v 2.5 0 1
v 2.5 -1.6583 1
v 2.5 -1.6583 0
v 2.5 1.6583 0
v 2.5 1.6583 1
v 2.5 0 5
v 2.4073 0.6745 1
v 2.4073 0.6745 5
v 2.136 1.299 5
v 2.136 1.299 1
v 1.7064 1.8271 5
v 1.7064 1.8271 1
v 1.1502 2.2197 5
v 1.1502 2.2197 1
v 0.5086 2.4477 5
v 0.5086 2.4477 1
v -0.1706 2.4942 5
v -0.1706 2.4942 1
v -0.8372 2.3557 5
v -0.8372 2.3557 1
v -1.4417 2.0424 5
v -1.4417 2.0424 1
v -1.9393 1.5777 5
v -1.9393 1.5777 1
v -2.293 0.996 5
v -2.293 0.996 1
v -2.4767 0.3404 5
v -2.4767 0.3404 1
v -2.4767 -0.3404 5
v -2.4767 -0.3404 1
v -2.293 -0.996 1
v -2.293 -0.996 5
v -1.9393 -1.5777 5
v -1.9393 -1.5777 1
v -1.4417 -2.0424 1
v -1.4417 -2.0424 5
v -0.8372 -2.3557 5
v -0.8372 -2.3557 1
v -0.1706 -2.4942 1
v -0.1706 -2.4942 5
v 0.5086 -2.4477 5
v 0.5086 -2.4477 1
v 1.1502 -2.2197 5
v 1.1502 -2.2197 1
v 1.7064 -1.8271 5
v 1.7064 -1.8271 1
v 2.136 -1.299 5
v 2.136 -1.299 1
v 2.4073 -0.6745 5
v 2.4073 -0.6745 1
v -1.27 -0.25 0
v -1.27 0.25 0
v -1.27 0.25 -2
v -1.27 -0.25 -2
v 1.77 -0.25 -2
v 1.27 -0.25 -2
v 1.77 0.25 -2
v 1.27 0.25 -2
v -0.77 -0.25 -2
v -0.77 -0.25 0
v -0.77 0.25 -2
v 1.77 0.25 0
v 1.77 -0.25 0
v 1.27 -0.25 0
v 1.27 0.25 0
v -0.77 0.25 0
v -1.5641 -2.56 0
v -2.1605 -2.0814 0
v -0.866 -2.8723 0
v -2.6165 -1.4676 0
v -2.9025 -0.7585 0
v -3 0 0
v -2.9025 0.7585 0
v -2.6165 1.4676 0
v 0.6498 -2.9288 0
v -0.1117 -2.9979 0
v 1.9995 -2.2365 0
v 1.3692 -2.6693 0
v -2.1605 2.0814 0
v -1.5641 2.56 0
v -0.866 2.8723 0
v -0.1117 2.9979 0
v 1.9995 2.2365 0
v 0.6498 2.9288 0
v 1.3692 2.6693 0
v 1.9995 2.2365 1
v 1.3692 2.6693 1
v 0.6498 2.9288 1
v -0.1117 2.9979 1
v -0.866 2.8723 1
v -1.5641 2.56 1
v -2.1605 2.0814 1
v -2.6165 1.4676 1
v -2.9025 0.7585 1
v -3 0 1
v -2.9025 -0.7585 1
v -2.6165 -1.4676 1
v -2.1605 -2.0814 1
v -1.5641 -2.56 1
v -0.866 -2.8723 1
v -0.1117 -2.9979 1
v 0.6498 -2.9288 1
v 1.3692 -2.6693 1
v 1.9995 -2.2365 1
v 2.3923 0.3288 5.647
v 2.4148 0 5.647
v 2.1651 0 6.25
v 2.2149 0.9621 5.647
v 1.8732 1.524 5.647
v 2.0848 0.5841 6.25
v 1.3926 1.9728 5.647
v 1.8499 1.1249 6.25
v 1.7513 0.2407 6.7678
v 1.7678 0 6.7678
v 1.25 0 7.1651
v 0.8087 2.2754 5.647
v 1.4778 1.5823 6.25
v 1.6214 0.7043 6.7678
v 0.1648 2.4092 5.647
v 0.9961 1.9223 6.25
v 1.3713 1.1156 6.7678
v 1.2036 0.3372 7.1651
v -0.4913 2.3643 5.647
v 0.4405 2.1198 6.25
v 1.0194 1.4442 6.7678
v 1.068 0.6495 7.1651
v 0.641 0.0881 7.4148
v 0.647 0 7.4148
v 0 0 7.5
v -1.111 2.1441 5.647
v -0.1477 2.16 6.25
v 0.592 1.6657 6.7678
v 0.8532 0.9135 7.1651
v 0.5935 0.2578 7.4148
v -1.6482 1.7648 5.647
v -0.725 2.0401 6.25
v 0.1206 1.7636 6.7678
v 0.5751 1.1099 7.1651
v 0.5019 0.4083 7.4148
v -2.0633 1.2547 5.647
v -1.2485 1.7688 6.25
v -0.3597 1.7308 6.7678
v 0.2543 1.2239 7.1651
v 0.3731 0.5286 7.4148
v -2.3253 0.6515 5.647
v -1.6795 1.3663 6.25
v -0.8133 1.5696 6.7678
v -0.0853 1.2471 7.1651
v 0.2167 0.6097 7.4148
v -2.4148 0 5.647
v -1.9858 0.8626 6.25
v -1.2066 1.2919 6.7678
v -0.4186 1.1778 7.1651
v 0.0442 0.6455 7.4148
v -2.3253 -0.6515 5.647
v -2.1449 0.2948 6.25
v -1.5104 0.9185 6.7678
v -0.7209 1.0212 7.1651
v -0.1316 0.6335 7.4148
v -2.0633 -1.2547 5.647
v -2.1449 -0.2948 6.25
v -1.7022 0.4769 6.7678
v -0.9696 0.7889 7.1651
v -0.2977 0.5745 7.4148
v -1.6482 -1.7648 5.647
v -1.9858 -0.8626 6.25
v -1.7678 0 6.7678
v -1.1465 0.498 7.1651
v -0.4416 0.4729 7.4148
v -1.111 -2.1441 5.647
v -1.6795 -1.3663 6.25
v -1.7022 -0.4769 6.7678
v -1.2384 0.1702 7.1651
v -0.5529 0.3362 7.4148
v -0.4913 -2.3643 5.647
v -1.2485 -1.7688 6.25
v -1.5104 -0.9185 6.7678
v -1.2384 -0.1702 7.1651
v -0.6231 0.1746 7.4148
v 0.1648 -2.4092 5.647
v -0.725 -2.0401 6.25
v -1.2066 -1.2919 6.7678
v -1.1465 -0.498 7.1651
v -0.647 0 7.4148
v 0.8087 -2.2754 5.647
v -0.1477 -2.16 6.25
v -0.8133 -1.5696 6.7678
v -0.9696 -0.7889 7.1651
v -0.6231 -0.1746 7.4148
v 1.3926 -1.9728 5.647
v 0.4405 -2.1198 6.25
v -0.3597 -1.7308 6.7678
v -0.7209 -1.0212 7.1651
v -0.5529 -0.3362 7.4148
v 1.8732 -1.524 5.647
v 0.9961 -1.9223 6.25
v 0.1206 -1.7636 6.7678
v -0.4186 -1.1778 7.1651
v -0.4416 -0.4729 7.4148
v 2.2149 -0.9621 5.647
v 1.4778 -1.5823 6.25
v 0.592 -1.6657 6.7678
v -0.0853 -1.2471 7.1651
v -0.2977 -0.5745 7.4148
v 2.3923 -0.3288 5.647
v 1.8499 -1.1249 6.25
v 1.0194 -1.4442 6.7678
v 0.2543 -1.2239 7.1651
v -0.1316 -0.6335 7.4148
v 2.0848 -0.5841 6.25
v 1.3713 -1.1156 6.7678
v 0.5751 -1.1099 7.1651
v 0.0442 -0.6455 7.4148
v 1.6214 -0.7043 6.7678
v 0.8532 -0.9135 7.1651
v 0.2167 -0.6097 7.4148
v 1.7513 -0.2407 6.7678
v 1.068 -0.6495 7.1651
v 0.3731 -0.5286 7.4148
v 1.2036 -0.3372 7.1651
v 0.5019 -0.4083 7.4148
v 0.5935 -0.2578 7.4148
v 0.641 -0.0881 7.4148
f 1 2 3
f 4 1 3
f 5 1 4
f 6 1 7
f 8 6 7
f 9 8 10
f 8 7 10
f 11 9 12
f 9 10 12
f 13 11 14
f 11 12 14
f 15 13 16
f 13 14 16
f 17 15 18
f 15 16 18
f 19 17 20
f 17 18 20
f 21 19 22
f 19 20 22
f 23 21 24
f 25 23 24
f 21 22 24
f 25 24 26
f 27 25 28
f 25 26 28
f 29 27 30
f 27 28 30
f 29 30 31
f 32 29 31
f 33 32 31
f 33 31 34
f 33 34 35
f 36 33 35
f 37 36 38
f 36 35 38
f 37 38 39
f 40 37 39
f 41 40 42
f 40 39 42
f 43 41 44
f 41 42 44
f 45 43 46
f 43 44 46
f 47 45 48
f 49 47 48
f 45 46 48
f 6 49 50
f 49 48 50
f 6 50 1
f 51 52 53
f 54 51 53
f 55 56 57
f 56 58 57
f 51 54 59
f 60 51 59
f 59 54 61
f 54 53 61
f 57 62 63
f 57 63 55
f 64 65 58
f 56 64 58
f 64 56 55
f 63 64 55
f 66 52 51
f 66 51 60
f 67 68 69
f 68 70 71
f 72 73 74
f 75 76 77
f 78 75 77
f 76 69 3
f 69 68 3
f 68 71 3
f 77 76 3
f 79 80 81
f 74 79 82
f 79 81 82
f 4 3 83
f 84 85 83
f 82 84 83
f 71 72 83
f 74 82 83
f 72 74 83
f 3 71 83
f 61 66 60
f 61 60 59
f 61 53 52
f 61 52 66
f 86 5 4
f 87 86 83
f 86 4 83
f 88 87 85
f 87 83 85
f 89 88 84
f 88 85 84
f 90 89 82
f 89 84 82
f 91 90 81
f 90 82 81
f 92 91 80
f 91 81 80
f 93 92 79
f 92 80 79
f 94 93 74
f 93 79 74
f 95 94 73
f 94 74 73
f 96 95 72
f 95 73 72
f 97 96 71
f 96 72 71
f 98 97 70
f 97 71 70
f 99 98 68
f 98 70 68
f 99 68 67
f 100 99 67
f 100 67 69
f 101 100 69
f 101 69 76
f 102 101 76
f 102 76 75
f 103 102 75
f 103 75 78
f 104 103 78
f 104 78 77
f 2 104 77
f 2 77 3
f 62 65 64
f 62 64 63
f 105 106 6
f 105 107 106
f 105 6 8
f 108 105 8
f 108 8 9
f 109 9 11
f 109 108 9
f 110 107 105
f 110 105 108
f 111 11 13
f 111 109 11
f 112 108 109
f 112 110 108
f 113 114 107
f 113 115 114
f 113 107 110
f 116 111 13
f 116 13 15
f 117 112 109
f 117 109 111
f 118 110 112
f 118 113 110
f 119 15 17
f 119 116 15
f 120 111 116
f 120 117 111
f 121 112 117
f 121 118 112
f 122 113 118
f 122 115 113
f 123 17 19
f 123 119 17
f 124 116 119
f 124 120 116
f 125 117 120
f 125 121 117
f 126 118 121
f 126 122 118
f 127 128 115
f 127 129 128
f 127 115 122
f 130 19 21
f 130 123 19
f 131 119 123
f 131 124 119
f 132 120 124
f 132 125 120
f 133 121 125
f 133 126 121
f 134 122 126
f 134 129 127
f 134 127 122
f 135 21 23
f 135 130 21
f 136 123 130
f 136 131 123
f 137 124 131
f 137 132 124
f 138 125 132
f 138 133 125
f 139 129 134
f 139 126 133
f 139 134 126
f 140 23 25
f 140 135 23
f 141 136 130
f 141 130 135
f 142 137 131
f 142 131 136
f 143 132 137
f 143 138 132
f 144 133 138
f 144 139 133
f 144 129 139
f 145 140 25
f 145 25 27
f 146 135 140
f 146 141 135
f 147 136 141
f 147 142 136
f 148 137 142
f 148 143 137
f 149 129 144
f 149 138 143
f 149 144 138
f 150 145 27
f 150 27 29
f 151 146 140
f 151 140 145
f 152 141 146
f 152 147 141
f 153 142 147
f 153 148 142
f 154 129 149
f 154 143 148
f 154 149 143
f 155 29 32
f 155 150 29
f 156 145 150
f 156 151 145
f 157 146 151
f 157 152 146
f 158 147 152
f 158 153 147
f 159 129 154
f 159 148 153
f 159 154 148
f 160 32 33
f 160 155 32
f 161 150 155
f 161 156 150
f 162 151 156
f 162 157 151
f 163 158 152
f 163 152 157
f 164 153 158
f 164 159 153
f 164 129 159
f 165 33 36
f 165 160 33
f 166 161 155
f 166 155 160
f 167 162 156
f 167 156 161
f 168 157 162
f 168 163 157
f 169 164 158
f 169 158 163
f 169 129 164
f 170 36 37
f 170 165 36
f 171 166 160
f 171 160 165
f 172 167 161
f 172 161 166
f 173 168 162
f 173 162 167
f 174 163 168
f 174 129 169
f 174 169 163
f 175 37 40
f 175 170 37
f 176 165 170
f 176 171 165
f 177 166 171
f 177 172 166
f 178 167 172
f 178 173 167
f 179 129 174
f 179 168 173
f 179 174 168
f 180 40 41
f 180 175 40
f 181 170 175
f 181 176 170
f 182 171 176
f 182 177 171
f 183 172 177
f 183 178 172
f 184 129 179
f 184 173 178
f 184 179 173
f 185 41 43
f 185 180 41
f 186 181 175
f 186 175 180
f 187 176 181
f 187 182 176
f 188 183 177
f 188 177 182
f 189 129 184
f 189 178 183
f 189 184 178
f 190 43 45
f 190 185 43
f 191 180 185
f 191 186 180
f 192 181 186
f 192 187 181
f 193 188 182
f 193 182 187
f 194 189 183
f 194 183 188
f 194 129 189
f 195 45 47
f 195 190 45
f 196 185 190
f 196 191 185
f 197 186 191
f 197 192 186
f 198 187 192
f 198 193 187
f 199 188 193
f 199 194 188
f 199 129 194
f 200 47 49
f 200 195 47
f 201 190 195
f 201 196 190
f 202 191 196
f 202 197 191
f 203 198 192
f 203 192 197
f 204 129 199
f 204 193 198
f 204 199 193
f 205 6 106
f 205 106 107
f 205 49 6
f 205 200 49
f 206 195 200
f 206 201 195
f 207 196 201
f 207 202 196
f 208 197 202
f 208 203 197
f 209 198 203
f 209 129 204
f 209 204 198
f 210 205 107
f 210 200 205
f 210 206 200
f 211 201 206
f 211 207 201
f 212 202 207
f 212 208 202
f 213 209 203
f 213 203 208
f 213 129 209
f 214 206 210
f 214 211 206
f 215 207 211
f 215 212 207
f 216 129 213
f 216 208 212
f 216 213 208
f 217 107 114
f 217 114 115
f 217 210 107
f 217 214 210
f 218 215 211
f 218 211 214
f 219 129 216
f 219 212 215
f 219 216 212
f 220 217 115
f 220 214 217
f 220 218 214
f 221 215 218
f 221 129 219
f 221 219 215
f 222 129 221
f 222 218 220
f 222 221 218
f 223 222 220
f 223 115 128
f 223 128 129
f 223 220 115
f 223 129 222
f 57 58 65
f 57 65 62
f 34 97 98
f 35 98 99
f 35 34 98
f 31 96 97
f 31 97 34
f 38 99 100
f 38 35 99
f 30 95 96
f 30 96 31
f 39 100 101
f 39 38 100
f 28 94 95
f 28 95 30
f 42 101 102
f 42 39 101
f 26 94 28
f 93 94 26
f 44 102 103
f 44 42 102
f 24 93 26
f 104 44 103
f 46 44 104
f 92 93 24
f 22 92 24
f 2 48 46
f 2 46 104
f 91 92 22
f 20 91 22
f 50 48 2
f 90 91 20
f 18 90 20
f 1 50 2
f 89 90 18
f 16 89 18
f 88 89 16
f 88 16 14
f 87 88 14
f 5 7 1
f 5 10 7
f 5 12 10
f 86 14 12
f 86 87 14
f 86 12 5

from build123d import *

# Parameters (mm, degrees)
SKETCH1_R           = 3
BOSS_EXTRUDE1_DEPTH = 1
SKETCH2_R           = 2.5
BOSS_EXTRUDE2_DEPTH = 4
DOME1_FACE_RADIUS   = 2.5
DOME1_HEIGHT        = 2.5
CUT_EXTRUDE1_REACH  = 9.762
SKETCH3_W           = 0.5
SKETCH3_H           = 4.031292186
SKETCH8_W           = 0.5
SKETCH8_H           = 2
BASE_FLANGE1_DEPTH  = 0.25
SKETCH9_W           = 0.5
SKETCH9_H           = 2
BASE_FLANGE2_DEPTH  = 0.25


# Sheet-metal steps are written as plain solids
with BuildPart() as part:
    # Sketch1 → Boss-Extrude1 (new body)
    with BuildSketch(Plane.XY):
        Circle(SKETCH1_R)
    extrude(amount=BOSS_EXTRUDE1_DEPTH)

    # Sketch2 → Boss-Extrude2 (add)
    with BuildSketch(Plane.XY.offset(1)):
        Circle(SKETCH2_R)
    extrude(amount=BOSS_EXTRUDE2_DEPTH)

    # Dome1: a dome of height H over a round flat face of radius A is a cap of a sphere of radius (A * A + H * H) / (2 * H)
    dome1_r = (DOME1_FACE_RADIUS * DOME1_FACE_RADIUS + DOME1_HEIGHT * DOME1_HEIGHT) / (2 * DOME1_HEIGHT)
    dome1_base = Plane((0, 0, 5), z_dir=(0, 0, 1))
    with Locations(dome1_base.offset(DOME1_HEIGHT - dome1_r)):
        dome1_ball = Sphere(dome1_r, mode=Mode.PRIVATE)
    add(split(dome1_ball, bisect_by=dome1_base, keep=Keep.TOP, mode=Mode.PRIVATE))

    # Sketch3 → Cut-Extrude1 (cut, up to next)
    with BuildSketch(Plane.XY.offset(1), mode=Mode.PRIVATE) as cut_extrude1_sk1:
        with Locations((2.75, -0.165370345)):
            Rectangle(SKETCH3_W, SKETCH3_H)
    cut_extrude1_tool1 = extrude(cut_extrude1_sk1.sketch, amount=-CUT_EXTRUDE1_REACH, mode=Mode.PRIVATE) & part.part
    add(cut_extrude1_tool1.solids().sort_by_distance((2.75, -0.16537, 1))[0], mode=Mode.SUBTRACT)


with BuildPart() as body_2:
    # Sketch8 → Base-Flange1 (new, symmetric)
    with BuildSketch(Plane(origin=(0, 0, 0), x_dir=(1, 0, 0), z_dir=(0, 1, 0))):
        with Locations((-1.02, 1)):
            Rectangle(SKETCH8_W, SKETCH8_H)
    extrude(amount=BASE_FLANGE1_DEPTH, both=True)


with BuildPart() as body_3:
    # Sketch9 → Base-Flange2 (new, symmetric)
    with BuildSketch(Plane(origin=(0, 0, 0), x_dir=(1, 0, 0), z_dir=(0, 1, 0))):
        with Locations((1.52, 1)):
            Rectangle(SKETCH9_W, SKETCH9_H)
    extrude(amount=BASE_FLANGE2_DEPTH, both=True)


solid = Compound([part.part, body_2.part, body_3.part])
